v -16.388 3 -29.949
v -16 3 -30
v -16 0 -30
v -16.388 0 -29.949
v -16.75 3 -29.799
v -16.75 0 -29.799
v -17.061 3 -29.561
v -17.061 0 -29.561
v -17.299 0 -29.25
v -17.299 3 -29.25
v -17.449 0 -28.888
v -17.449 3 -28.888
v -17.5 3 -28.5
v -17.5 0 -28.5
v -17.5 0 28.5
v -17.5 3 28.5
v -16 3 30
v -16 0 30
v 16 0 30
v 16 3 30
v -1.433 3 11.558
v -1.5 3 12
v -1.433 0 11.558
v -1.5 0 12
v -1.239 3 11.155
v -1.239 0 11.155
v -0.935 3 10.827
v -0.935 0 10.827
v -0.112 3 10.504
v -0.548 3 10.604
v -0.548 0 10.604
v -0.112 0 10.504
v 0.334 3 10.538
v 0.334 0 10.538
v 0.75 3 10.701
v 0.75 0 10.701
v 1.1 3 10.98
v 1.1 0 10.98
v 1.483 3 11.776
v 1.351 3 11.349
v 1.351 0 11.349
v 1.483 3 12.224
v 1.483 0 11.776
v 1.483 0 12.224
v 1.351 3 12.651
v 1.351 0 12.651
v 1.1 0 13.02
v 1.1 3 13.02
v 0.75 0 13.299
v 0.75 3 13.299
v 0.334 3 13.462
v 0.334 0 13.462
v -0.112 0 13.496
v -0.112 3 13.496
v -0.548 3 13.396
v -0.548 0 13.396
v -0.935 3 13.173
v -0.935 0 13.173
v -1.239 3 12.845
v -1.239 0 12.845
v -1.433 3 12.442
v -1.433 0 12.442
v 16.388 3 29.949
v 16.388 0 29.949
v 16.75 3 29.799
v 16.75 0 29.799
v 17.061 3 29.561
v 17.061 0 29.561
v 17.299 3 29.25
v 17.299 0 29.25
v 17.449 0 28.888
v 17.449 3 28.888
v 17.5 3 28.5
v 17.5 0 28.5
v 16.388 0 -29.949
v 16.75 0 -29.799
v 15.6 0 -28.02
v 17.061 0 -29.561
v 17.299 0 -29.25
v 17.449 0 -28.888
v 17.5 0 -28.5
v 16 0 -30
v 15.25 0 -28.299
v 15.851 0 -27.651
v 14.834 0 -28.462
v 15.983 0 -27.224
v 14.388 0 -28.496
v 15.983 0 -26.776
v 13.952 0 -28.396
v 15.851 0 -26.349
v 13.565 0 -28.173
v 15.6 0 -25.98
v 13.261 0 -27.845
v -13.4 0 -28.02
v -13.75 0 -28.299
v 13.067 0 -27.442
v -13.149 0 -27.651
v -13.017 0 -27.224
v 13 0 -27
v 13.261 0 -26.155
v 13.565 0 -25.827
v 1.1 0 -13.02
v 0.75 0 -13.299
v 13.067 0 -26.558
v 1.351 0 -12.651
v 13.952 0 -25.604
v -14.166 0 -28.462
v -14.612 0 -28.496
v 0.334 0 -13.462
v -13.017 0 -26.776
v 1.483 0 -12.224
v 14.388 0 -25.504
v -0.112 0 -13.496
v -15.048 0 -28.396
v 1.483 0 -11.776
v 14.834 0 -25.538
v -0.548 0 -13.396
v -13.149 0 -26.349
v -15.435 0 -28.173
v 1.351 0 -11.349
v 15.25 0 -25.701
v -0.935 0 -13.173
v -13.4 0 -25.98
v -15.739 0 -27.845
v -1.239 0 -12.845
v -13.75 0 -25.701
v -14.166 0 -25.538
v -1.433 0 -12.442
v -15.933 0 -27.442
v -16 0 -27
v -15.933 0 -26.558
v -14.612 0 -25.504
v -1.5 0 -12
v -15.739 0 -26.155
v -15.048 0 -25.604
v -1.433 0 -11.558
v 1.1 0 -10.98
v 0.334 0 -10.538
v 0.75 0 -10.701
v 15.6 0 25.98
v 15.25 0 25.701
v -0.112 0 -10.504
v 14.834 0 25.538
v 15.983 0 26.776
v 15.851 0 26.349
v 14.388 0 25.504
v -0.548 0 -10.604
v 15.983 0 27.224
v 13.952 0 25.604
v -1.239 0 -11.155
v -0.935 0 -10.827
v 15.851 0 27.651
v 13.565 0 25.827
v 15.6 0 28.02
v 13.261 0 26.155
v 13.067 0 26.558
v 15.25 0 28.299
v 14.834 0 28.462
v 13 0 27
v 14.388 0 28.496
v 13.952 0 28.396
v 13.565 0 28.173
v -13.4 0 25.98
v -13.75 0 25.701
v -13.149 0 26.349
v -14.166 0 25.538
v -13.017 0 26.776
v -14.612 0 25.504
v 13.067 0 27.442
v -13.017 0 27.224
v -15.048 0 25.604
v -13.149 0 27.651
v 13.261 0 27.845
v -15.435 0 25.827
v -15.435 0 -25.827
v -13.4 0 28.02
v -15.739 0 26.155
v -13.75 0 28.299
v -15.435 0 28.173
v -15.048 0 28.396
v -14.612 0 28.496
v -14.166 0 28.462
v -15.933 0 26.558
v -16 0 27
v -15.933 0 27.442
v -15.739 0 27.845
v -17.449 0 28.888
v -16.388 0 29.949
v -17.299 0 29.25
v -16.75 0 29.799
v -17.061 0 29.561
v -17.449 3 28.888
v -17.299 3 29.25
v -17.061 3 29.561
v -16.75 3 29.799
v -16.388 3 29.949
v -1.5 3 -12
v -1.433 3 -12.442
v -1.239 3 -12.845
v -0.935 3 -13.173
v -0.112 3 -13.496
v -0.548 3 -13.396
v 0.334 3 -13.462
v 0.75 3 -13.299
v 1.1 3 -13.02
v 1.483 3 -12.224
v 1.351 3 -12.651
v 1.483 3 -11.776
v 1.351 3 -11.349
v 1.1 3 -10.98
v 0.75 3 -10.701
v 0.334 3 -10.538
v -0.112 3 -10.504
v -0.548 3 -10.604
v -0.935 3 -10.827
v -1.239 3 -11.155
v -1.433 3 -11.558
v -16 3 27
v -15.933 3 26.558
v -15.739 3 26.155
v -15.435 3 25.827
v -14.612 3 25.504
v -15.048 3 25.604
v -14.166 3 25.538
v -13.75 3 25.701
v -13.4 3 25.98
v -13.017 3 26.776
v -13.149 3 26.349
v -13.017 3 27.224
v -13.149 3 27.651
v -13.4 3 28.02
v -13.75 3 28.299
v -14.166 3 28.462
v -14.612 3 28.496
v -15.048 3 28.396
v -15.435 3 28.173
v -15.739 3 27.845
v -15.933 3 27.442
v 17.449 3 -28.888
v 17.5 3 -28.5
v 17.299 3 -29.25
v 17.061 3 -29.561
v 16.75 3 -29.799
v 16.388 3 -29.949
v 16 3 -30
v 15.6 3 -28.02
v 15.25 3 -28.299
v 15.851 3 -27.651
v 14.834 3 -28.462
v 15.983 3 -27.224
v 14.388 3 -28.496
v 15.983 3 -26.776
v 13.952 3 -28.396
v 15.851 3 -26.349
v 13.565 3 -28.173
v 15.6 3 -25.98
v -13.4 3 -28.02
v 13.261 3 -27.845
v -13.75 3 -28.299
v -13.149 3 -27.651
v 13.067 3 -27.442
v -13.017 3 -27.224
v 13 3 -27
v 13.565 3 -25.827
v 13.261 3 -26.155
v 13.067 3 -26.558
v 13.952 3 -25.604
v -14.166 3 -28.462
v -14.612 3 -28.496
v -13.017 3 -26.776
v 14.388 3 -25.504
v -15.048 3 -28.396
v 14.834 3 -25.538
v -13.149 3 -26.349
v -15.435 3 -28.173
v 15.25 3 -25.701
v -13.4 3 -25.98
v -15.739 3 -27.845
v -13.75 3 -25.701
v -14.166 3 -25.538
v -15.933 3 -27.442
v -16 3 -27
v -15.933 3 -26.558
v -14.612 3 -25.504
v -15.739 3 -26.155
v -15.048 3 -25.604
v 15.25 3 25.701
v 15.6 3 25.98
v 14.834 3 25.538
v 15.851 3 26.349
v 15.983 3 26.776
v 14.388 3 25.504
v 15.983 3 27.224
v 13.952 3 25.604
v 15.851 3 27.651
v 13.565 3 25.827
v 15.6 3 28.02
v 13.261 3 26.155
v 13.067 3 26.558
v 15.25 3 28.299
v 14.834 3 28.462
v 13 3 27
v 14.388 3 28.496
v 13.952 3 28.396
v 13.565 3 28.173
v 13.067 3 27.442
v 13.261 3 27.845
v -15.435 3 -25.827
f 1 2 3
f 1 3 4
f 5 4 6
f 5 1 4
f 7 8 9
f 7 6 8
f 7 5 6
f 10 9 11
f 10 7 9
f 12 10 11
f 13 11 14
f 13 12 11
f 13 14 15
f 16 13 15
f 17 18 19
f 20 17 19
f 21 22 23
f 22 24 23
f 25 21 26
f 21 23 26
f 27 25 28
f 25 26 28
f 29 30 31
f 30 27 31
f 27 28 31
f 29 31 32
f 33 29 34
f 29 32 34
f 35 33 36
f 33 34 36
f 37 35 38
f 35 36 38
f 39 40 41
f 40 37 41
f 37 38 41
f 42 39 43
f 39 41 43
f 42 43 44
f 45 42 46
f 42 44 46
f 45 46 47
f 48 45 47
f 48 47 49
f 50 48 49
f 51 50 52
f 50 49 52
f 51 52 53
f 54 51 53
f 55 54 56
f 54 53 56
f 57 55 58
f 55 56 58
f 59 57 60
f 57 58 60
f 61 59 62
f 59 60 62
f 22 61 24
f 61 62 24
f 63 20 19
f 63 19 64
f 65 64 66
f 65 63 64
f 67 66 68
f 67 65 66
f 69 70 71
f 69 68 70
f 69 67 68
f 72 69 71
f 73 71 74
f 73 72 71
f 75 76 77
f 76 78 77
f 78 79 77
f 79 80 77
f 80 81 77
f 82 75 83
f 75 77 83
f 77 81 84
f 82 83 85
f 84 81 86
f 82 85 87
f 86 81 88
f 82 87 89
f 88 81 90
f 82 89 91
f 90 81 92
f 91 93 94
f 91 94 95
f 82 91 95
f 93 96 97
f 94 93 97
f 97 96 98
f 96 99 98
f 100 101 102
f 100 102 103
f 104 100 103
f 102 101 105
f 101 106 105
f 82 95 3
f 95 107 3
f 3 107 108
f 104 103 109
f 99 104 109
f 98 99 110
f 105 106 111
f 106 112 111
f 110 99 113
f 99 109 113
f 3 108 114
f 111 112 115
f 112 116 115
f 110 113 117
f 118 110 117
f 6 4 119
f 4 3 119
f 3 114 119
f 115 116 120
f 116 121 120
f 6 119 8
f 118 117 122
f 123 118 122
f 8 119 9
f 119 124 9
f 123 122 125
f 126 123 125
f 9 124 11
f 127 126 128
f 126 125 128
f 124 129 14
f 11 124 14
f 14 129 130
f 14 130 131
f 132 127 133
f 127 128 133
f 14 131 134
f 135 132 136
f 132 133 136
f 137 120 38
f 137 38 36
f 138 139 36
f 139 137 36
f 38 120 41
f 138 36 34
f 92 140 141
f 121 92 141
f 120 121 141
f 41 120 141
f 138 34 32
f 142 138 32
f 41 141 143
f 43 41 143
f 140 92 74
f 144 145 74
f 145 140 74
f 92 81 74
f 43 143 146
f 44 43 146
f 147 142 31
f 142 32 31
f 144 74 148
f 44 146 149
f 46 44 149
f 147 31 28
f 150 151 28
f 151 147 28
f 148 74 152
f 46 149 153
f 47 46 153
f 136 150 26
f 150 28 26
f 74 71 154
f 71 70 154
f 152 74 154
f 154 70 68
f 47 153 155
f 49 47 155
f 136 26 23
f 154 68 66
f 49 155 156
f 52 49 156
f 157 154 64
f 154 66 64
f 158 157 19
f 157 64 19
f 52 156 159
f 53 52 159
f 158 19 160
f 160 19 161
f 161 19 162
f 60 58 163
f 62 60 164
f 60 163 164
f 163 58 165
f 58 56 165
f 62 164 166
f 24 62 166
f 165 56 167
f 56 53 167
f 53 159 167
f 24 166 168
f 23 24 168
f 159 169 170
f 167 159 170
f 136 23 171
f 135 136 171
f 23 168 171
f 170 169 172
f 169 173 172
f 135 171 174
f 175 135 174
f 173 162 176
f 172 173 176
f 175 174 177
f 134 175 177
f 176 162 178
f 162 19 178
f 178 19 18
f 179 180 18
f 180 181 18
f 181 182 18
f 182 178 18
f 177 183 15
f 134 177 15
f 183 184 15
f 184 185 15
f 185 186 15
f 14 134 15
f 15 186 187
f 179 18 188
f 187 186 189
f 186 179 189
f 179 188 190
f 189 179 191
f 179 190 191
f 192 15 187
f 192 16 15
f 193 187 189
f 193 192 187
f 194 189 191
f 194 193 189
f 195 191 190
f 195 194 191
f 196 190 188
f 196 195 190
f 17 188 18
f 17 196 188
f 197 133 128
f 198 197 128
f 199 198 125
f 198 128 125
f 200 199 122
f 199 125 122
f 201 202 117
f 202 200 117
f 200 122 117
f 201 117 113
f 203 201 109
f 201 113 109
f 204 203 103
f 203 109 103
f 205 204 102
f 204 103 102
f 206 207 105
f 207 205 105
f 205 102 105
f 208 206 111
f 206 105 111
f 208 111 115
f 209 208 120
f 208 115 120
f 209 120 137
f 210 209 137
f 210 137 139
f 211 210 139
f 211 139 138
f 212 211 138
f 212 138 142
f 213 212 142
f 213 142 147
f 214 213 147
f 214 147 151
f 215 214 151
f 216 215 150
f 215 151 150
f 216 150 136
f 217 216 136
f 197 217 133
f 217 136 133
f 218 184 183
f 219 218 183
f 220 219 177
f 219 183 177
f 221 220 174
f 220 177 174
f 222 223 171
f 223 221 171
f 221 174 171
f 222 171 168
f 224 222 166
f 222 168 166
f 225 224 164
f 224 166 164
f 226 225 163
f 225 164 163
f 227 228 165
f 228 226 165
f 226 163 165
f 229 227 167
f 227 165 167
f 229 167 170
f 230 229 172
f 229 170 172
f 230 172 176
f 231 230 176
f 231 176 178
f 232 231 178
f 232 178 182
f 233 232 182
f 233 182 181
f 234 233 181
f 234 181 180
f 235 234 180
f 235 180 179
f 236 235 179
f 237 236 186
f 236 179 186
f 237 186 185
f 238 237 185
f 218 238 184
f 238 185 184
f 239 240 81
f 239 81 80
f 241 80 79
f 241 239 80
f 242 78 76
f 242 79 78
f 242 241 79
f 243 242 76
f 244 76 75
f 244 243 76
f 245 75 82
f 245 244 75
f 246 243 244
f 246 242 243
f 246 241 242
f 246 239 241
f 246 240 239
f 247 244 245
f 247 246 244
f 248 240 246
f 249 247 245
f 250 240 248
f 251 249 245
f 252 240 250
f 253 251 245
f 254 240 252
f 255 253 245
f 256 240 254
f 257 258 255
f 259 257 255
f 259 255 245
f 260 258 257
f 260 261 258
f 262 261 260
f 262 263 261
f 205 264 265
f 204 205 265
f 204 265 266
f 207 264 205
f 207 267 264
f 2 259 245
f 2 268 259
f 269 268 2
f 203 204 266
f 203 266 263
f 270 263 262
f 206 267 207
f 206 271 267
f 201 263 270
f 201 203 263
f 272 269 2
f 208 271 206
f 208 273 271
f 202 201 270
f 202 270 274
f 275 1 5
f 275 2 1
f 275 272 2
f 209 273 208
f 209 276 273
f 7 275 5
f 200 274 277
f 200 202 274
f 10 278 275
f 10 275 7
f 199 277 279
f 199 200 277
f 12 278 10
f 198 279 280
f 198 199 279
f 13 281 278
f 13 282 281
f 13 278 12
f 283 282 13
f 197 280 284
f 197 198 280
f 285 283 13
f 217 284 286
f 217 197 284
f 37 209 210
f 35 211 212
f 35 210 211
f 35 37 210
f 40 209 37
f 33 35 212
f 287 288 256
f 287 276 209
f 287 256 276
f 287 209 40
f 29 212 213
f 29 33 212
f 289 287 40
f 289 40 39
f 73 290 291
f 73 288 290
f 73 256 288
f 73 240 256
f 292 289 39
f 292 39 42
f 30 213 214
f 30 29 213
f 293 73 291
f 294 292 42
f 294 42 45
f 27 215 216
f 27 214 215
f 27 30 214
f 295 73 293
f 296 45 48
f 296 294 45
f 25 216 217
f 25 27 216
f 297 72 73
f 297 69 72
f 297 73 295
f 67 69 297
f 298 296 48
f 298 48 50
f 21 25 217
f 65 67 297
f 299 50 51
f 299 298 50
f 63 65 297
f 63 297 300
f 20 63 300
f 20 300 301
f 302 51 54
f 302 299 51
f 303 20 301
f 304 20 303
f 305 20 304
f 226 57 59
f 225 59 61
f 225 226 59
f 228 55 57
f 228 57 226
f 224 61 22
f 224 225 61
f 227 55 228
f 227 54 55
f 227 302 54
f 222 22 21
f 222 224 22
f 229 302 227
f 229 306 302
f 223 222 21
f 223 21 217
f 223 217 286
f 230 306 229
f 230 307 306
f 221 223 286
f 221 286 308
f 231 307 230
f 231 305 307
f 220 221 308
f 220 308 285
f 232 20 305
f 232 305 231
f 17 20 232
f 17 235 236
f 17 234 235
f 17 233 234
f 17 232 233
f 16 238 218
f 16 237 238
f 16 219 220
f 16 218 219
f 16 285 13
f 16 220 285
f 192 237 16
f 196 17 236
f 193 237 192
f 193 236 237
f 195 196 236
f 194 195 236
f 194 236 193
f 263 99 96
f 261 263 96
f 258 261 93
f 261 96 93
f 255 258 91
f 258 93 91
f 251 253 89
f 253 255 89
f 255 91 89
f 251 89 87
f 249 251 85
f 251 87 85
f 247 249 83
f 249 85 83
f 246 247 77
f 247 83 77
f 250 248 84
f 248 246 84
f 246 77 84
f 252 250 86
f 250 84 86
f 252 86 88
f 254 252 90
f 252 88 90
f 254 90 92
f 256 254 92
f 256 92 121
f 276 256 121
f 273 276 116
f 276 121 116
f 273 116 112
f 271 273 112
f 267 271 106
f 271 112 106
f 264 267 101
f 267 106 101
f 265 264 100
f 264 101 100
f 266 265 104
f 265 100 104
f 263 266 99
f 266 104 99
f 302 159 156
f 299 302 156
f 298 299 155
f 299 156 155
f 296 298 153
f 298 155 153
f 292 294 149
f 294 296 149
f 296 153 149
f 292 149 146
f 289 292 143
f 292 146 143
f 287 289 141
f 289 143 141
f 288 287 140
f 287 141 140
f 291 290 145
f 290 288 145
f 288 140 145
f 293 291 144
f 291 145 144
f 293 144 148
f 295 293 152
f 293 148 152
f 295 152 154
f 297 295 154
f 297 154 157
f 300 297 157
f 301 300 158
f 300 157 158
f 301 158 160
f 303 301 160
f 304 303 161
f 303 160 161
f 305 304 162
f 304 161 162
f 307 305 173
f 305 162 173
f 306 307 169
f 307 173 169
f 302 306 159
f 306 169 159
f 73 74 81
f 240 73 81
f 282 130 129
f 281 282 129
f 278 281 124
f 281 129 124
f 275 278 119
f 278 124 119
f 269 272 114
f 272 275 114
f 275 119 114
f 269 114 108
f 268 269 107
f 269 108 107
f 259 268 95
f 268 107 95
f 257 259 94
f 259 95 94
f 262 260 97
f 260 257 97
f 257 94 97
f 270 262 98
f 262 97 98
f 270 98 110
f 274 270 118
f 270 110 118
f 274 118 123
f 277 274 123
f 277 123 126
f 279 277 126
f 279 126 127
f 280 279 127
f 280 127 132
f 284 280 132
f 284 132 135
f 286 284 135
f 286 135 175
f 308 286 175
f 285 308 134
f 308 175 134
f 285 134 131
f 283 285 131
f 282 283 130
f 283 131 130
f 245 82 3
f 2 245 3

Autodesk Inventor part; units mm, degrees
ref_plane "YZ Plane" through (0, 0, 0) normal (1, 0, 0) x (0, 1, 0)
ref_plane "XZ Plane" through (0, 0, 0) normal (0, 1, 0) x (-1, 0, 0)
ref_plane "XY Plane" through (0, 0, 0) normal (0, 0, 1) x (1, 0, 0)
sketch "Sketch1" plane through (0, 0, 0) normal (0, 1, 0) x (-1, 0, 0)
  line L0 (11.5, 24) -> (-11.5, 24)
  line L1 (-11.5, 24) -> (-11.5, -24)
  line L2 (-11.5, -24) -> (11.5, -24)
  line L3 (11.5, -24) -> (11.5, 24)
  line L4 (11.5, 24) -> (-11.5, -24) construction
  line L5 (-11.5, 24) -> (11.5, -24) construction
  line L6 (-8.5, 21) -> (8.5, 21)
  line L7 (8.5, 21) -> (8.5, -21)
  line L8 (8.5, -21) -> (-8.5, -21)
  line L9 (-8.5, -21) -> (-8.5, 21)
  line L10 (-8.5, 21) -> (8.5, -21) construction
  line L11 (8.5, 21) -> (-8.5, -21) construction
  line L12 (0, 0) -> (-8.5, 0) construction
  circle A0 centre (0, -12) radius 1.5
  circle A1 centre (0, 12) radius 1.5
  line L13 (17.5, 30) -> (-17.5, 30)
  line L14 (-17.5, 30) -> (-17.5, -30)
  line L15 (-17.5, -30) -> (17.5, -30)
  line L16 (17.5, -30) -> (17.5, 30)
  line L17 (17.5, 30) -> (-17.5, -30) construction
  line L18 (-17.5, 30) -> (17.5, -30) construction
  circle A2 centre (14.5, 27) radius 1.5
  circle A3 centre (-14.5, 27) radius 1.5
  circle A4 centre (14.5, -27) radius 1.5
  circle A5 centre (-14.5, -27) radius 1.5
  dimension "d0" = 23
  dimension "d1" = 48
  dimension "d3" = 3
  dimension "d4" = 3
  dimension "d5" = 3
  dimension "d6" = 12
  dimension "d9" = 6
  dimension "d10" = 6
  dimension "d13" = 3
  dimension "d14" = 3
  dimension "d15" = 3
  dimension "d16" = 3
  dimension "d17" = 3
  dimension "d18" = 3
extrude "Extrusion1" add sketch "Sketch1" along normal blind 3 contours L3 L2 L1 L0 | L6 L7 L8 L9 | L16 L15 L14 L13
fillet "Fillet2" radius 1.5 4 edges at (17.5, 1.5, -30) (17.5, 1.5, 30) (-17.5, 1.5, 30) (-17.5, 1.5, -30)
properties part number "Top&Bottom"
